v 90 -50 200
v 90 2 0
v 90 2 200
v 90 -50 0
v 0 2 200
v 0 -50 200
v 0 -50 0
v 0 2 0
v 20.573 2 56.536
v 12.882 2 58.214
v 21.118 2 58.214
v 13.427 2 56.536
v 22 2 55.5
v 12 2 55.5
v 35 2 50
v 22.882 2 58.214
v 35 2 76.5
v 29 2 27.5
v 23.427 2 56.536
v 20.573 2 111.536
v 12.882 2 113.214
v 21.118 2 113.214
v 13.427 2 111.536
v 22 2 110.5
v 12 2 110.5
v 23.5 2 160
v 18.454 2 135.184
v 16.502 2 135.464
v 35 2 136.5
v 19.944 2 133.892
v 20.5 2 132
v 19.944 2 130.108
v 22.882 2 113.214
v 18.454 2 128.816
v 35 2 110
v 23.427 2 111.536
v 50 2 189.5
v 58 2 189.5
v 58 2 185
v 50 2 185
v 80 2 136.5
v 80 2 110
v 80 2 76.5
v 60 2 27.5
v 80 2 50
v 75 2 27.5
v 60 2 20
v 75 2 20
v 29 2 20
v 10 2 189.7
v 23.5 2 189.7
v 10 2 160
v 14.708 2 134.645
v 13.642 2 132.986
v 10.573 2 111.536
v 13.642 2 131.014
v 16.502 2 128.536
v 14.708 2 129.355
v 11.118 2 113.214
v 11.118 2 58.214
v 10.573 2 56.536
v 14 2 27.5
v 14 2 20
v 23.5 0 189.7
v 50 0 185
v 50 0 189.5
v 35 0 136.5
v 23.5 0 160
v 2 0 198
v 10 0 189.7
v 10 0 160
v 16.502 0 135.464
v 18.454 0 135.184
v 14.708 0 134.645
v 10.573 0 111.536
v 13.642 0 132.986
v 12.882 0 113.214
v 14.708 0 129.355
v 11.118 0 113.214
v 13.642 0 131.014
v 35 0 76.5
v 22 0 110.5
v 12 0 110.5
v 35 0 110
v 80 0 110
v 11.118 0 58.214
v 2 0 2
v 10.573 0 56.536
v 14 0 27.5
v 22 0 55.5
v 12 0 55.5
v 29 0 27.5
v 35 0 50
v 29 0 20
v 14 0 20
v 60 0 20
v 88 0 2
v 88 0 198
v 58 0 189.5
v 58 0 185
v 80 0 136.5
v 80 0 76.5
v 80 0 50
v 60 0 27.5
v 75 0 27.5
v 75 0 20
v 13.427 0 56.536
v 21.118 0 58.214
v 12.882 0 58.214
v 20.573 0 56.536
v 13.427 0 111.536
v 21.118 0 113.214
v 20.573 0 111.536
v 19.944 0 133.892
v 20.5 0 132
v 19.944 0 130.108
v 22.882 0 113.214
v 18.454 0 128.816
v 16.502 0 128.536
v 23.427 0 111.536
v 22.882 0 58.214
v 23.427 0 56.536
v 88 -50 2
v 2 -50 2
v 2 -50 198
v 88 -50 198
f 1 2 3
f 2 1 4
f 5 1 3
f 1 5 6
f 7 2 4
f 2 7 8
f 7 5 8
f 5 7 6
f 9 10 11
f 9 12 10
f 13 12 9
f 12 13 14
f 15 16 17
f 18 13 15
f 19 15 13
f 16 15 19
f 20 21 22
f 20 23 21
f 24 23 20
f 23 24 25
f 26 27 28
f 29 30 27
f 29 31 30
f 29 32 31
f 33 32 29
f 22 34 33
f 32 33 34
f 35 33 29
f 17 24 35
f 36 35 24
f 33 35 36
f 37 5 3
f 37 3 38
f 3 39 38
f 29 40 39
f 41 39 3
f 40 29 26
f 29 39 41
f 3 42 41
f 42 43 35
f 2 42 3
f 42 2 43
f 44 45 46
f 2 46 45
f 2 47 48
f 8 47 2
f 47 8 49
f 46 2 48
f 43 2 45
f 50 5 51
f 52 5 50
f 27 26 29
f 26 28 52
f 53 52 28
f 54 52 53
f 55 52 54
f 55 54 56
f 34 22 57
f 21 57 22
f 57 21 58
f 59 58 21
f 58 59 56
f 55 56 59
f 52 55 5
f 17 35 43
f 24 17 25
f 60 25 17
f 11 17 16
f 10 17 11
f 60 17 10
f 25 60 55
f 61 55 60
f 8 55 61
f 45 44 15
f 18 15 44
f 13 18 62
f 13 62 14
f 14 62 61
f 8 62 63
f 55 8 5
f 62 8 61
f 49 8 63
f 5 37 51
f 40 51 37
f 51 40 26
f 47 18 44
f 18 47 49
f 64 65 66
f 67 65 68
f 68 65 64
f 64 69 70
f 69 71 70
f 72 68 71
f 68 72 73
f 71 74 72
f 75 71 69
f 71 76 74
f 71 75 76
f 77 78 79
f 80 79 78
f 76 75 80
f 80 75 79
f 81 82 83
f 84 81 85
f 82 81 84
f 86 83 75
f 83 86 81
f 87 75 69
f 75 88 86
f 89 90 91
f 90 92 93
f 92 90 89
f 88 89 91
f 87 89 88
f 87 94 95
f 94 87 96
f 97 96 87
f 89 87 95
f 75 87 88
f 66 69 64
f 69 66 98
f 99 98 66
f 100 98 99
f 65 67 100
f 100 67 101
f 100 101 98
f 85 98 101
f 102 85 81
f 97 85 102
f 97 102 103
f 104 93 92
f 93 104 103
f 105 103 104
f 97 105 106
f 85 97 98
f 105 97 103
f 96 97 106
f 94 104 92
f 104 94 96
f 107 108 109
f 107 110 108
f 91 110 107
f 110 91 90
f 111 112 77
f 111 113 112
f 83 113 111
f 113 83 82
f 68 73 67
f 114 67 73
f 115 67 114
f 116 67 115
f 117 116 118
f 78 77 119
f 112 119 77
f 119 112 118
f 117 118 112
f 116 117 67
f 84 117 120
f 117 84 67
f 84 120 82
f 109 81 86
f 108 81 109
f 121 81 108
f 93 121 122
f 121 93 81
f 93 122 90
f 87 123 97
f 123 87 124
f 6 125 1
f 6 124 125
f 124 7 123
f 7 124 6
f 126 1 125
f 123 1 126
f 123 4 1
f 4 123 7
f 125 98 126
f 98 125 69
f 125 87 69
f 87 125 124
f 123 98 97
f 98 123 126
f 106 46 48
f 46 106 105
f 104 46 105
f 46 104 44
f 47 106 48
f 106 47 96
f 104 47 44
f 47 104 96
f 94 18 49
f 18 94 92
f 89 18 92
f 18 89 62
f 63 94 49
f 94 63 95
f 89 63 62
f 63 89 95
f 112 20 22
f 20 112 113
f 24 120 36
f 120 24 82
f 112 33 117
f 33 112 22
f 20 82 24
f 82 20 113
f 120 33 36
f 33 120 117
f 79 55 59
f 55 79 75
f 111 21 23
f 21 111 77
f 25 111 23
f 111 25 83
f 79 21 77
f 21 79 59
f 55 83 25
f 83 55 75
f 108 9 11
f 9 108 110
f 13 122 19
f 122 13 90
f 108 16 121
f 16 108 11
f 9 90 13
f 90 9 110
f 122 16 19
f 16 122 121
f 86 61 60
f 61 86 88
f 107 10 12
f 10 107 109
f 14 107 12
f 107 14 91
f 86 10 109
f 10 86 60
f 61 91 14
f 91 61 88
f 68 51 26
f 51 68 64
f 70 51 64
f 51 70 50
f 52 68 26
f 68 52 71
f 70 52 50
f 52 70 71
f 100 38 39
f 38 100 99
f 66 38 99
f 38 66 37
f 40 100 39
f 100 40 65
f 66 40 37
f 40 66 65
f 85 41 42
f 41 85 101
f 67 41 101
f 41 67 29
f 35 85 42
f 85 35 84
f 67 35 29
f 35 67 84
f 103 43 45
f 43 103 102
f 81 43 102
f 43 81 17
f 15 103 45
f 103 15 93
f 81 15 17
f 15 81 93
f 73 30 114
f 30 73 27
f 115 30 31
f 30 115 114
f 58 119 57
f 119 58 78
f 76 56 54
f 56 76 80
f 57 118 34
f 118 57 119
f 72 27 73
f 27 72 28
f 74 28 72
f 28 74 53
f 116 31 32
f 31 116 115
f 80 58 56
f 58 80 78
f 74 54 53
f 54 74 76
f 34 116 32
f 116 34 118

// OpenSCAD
difference(){
union(){
cube([90,2,200]);
translate([0,0,2])
rotate([-90,0,-90])
cube([50,2,90]);
translate([0,0,200])
rotate([-90,0,-90])
cube([50,2,90]);
rotate([0,0,-90])
cube([50,2,200]);
translate([90-2,0,0])
rotate([0,0,-90])
cube([50,2,200]);
}
translate([10,-5,160])cube([13.5,10,29.7]);
translate([50,-5,185])cube([8,10,4.5]);
translate([35,-5,110])cube([45,10,26.5]);
translate([35,-5,50])cube([45,10,26.5]);
translate([60,-5,20])
union(){
  translate([0,0,0])cube([15,10,7.5]);
  translate([-15-31,0,0])cube([15,10,7.5]);
}
translate([12,0,60-3+30+25])
rotate([0,90,0])
union(){
  translate([0,0,10])
  rotate([90,0,0])cylinder(d=3,h=10,center=true);
  rotate([90,0,0])cylinder(d=3,h=10,center=true);
}
translate([12,0,60-3])
rotate([0,90,0])
union(){
  translate([0,0,10])
  rotate([90,0,0])cylinder(d=3,h=10,center=true);
  rotate([90,0,0])cylinder(d=3,h=10,center=true);
}
translate([17,0,60-3+65+10])
  rotate([90,0,0])cylinder(d=7,h=10,center=true);
}
